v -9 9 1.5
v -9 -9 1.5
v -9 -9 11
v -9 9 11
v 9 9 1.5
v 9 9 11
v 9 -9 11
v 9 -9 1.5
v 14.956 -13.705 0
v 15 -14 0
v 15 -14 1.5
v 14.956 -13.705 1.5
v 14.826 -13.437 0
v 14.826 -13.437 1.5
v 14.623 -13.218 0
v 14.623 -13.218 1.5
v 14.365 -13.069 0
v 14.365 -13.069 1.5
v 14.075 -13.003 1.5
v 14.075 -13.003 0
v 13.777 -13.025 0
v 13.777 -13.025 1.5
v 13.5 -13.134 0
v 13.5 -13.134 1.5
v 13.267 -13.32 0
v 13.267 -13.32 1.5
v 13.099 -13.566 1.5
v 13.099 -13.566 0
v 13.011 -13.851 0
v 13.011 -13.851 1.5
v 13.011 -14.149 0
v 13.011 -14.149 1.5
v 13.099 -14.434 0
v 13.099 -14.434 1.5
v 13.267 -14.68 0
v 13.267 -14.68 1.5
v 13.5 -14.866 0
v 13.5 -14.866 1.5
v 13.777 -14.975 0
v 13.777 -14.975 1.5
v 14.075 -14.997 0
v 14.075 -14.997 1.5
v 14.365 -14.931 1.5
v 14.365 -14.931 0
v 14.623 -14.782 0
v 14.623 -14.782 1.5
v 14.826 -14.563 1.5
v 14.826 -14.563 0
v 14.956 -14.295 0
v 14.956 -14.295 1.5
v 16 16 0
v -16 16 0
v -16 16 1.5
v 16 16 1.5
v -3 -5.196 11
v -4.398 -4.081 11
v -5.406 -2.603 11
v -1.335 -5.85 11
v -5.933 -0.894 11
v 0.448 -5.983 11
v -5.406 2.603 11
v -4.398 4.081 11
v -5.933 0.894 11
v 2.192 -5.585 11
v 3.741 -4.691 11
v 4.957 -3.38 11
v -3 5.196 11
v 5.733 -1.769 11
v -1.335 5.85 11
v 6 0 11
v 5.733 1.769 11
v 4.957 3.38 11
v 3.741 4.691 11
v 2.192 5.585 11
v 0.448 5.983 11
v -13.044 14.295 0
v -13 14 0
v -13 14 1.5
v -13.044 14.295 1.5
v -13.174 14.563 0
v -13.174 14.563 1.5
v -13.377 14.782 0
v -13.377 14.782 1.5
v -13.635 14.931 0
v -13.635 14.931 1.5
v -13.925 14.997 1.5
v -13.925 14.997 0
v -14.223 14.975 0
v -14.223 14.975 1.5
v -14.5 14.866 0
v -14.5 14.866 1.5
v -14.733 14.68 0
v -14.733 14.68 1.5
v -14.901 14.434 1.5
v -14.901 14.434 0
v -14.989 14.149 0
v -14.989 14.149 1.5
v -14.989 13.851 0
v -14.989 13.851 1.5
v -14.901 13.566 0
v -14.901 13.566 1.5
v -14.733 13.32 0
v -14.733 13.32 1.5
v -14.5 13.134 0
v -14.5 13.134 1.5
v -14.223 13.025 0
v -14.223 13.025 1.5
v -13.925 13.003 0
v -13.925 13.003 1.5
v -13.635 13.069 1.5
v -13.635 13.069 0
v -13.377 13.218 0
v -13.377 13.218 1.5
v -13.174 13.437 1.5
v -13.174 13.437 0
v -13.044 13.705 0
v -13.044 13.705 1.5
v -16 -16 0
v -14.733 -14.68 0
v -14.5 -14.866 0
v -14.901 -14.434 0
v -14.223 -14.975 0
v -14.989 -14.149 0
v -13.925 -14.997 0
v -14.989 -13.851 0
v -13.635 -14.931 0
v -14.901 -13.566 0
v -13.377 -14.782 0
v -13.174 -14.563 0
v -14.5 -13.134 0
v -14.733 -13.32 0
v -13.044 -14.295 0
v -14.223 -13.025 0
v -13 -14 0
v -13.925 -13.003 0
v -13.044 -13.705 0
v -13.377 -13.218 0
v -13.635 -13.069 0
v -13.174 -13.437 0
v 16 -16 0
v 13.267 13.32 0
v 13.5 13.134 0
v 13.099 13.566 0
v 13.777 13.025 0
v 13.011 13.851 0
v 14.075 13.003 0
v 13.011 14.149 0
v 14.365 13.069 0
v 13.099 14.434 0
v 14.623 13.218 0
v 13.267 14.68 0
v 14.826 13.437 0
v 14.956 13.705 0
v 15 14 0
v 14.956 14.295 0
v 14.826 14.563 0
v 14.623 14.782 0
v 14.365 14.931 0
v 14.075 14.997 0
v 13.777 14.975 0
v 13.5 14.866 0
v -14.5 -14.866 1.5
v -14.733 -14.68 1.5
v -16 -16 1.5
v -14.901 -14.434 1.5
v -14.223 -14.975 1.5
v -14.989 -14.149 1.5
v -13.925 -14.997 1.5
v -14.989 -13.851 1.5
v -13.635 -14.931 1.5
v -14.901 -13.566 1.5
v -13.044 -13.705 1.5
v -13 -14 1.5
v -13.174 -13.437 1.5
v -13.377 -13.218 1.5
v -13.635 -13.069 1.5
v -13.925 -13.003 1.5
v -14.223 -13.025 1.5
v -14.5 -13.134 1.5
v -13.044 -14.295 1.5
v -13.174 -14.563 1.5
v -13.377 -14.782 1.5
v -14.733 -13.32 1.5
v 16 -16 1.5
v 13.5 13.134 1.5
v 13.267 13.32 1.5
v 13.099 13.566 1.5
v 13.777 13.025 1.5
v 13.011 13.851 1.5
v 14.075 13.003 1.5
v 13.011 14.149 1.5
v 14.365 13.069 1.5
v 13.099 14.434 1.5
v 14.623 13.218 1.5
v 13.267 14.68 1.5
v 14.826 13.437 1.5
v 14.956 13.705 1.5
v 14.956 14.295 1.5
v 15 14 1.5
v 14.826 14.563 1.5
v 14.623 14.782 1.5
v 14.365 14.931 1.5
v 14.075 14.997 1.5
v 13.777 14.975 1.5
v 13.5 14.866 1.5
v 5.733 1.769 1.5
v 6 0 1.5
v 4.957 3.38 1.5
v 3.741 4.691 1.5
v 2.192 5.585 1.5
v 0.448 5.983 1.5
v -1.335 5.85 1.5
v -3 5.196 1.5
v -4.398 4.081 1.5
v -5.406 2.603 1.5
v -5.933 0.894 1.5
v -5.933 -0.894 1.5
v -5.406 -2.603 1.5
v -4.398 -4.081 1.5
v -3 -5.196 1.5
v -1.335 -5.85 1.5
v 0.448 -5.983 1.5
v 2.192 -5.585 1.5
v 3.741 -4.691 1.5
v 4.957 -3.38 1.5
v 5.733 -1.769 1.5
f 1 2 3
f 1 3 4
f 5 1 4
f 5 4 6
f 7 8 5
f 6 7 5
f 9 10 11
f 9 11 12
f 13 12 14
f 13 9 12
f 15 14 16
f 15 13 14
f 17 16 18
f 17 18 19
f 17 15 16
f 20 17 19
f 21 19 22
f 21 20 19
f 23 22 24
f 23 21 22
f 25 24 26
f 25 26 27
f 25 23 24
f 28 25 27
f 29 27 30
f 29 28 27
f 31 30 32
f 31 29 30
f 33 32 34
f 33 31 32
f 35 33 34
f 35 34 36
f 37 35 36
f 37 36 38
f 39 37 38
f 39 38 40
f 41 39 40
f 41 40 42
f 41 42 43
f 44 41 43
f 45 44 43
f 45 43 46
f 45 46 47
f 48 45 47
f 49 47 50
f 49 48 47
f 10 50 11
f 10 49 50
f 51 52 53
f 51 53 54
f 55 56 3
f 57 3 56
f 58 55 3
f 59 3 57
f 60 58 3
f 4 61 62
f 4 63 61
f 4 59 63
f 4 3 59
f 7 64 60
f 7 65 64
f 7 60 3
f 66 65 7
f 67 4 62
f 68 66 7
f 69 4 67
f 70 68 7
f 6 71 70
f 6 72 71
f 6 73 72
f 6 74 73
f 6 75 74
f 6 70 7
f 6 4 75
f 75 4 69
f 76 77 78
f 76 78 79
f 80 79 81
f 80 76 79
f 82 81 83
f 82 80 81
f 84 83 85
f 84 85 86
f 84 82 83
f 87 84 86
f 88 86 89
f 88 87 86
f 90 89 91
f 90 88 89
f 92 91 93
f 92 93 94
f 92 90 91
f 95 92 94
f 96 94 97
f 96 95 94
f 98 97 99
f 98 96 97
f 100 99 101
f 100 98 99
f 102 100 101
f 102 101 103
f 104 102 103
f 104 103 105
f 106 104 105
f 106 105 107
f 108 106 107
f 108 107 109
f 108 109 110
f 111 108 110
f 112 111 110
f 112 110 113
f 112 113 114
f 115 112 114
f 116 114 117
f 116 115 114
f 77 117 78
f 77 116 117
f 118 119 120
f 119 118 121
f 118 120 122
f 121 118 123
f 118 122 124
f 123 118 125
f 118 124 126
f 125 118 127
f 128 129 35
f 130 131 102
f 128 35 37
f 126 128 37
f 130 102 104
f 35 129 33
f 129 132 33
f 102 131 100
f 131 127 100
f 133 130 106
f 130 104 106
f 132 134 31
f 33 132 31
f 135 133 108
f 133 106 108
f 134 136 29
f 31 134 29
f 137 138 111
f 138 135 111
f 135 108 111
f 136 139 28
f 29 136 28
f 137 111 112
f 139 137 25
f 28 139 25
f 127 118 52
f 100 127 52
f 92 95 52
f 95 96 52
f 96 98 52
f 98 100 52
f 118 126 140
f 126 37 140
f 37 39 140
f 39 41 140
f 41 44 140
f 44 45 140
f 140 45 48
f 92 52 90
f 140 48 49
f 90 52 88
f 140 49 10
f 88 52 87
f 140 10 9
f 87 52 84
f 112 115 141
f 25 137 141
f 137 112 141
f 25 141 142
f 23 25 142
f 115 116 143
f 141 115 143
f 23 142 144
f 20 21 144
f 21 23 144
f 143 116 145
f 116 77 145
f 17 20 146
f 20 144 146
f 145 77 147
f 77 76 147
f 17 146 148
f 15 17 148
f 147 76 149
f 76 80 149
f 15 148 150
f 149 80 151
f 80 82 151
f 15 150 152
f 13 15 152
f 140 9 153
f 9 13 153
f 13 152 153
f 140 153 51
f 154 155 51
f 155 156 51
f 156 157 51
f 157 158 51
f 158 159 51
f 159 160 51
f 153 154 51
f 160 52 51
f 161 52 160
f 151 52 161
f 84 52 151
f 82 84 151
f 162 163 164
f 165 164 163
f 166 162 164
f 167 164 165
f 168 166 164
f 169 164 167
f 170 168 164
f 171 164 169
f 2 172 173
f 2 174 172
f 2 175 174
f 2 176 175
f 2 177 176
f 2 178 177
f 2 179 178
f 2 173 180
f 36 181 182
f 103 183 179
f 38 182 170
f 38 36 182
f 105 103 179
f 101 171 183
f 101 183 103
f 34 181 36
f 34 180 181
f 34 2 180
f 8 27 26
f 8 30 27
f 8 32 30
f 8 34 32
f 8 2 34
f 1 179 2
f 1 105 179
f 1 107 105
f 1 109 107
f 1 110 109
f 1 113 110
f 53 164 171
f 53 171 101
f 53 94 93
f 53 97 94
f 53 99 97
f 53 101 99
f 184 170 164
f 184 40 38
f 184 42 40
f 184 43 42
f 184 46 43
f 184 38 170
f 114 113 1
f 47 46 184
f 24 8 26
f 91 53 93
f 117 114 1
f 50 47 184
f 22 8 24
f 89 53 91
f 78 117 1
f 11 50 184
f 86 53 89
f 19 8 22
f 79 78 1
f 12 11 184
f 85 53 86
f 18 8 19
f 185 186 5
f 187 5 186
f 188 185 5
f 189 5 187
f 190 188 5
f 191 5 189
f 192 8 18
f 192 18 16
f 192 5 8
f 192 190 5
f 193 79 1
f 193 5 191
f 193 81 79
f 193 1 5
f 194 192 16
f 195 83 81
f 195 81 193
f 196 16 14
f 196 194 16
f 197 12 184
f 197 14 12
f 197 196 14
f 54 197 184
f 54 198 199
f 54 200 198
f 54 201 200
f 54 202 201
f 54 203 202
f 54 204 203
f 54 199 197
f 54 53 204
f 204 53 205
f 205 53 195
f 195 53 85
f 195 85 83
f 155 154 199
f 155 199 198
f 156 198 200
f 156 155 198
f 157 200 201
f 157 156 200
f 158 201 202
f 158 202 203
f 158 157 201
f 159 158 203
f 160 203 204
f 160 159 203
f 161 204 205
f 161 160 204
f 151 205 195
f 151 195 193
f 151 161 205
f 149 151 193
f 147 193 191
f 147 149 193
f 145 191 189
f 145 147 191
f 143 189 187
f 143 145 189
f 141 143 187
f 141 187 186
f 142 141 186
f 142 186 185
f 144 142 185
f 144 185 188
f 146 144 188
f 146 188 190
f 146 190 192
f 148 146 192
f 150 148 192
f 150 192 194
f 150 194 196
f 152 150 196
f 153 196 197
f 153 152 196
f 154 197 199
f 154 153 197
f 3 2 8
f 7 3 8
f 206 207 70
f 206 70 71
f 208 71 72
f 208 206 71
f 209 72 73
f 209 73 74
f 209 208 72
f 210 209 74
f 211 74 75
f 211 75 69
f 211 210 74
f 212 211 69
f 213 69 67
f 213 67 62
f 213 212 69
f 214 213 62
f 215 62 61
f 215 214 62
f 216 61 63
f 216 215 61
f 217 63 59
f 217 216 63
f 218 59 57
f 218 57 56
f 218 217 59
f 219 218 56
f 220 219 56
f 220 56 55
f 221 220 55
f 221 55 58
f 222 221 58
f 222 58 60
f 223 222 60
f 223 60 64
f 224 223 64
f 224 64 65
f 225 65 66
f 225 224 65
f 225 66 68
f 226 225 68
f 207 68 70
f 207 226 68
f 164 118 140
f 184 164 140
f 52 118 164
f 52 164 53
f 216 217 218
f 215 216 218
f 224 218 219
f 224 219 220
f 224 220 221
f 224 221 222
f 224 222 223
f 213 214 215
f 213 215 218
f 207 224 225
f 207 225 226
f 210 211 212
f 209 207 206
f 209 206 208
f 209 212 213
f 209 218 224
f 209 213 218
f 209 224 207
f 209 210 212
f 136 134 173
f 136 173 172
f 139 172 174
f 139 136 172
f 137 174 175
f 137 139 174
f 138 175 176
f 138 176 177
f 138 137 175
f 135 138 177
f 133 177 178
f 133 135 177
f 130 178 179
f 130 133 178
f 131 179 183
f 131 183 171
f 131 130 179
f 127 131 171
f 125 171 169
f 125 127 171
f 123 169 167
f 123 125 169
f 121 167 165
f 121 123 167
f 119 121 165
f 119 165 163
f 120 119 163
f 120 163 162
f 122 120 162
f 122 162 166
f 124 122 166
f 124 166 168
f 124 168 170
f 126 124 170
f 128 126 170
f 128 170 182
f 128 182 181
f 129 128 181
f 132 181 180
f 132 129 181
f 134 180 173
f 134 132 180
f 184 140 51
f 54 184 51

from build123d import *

# Parameters (mm, degrees)
SKETCH_1_W      = 32
SKETCH_1_H      = 32
SKETCH_1_R      = 1
EXTRUDE_1_DEPTH = 1.5
SKETCH_2_W      = 18
SKETCH_2_H      = 18
SKETCH_2_R      = 6
EXTRUDE_2_DEPTH = 9.5


with BuildPart() as part:
    # ｽｹｯﾁ1 → ﾎﾞｽ - 押し出し1 (new body)
    with BuildSketch(Plane.XY):
        Rectangle(SKETCH_1_W, SKETCH_1_H)
        with Locations((-14, 14)):
            Circle(SKETCH_1_R, mode=Mode.SUBTRACT)
        with Locations((14, 14)):
            Circle(SKETCH_1_R, mode=Mode.SUBTRACT)
        with Locations((14, -14)):
            Circle(SKETCH_1_R, mode=Mode.SUBTRACT)
        with Locations((-14, -14)):
            Circle(SKETCH_1_R, mode=Mode.SUBTRACT)
    extrude(amount=EXTRUDE_1_DEPTH)

    # ｽｹｯﾁ2 → ﾎﾞｽ - 押し出し2 (add)
    with BuildSketch(Plane.XY.offset(1.5)):
        Rectangle(SKETCH_2_W, SKETCH_2_H)
        Circle(SKETCH_2_R, mode=Mode.SUBTRACT)
    extrude(amount=EXTRUDE_2_DEPTH)


solid = part.part
